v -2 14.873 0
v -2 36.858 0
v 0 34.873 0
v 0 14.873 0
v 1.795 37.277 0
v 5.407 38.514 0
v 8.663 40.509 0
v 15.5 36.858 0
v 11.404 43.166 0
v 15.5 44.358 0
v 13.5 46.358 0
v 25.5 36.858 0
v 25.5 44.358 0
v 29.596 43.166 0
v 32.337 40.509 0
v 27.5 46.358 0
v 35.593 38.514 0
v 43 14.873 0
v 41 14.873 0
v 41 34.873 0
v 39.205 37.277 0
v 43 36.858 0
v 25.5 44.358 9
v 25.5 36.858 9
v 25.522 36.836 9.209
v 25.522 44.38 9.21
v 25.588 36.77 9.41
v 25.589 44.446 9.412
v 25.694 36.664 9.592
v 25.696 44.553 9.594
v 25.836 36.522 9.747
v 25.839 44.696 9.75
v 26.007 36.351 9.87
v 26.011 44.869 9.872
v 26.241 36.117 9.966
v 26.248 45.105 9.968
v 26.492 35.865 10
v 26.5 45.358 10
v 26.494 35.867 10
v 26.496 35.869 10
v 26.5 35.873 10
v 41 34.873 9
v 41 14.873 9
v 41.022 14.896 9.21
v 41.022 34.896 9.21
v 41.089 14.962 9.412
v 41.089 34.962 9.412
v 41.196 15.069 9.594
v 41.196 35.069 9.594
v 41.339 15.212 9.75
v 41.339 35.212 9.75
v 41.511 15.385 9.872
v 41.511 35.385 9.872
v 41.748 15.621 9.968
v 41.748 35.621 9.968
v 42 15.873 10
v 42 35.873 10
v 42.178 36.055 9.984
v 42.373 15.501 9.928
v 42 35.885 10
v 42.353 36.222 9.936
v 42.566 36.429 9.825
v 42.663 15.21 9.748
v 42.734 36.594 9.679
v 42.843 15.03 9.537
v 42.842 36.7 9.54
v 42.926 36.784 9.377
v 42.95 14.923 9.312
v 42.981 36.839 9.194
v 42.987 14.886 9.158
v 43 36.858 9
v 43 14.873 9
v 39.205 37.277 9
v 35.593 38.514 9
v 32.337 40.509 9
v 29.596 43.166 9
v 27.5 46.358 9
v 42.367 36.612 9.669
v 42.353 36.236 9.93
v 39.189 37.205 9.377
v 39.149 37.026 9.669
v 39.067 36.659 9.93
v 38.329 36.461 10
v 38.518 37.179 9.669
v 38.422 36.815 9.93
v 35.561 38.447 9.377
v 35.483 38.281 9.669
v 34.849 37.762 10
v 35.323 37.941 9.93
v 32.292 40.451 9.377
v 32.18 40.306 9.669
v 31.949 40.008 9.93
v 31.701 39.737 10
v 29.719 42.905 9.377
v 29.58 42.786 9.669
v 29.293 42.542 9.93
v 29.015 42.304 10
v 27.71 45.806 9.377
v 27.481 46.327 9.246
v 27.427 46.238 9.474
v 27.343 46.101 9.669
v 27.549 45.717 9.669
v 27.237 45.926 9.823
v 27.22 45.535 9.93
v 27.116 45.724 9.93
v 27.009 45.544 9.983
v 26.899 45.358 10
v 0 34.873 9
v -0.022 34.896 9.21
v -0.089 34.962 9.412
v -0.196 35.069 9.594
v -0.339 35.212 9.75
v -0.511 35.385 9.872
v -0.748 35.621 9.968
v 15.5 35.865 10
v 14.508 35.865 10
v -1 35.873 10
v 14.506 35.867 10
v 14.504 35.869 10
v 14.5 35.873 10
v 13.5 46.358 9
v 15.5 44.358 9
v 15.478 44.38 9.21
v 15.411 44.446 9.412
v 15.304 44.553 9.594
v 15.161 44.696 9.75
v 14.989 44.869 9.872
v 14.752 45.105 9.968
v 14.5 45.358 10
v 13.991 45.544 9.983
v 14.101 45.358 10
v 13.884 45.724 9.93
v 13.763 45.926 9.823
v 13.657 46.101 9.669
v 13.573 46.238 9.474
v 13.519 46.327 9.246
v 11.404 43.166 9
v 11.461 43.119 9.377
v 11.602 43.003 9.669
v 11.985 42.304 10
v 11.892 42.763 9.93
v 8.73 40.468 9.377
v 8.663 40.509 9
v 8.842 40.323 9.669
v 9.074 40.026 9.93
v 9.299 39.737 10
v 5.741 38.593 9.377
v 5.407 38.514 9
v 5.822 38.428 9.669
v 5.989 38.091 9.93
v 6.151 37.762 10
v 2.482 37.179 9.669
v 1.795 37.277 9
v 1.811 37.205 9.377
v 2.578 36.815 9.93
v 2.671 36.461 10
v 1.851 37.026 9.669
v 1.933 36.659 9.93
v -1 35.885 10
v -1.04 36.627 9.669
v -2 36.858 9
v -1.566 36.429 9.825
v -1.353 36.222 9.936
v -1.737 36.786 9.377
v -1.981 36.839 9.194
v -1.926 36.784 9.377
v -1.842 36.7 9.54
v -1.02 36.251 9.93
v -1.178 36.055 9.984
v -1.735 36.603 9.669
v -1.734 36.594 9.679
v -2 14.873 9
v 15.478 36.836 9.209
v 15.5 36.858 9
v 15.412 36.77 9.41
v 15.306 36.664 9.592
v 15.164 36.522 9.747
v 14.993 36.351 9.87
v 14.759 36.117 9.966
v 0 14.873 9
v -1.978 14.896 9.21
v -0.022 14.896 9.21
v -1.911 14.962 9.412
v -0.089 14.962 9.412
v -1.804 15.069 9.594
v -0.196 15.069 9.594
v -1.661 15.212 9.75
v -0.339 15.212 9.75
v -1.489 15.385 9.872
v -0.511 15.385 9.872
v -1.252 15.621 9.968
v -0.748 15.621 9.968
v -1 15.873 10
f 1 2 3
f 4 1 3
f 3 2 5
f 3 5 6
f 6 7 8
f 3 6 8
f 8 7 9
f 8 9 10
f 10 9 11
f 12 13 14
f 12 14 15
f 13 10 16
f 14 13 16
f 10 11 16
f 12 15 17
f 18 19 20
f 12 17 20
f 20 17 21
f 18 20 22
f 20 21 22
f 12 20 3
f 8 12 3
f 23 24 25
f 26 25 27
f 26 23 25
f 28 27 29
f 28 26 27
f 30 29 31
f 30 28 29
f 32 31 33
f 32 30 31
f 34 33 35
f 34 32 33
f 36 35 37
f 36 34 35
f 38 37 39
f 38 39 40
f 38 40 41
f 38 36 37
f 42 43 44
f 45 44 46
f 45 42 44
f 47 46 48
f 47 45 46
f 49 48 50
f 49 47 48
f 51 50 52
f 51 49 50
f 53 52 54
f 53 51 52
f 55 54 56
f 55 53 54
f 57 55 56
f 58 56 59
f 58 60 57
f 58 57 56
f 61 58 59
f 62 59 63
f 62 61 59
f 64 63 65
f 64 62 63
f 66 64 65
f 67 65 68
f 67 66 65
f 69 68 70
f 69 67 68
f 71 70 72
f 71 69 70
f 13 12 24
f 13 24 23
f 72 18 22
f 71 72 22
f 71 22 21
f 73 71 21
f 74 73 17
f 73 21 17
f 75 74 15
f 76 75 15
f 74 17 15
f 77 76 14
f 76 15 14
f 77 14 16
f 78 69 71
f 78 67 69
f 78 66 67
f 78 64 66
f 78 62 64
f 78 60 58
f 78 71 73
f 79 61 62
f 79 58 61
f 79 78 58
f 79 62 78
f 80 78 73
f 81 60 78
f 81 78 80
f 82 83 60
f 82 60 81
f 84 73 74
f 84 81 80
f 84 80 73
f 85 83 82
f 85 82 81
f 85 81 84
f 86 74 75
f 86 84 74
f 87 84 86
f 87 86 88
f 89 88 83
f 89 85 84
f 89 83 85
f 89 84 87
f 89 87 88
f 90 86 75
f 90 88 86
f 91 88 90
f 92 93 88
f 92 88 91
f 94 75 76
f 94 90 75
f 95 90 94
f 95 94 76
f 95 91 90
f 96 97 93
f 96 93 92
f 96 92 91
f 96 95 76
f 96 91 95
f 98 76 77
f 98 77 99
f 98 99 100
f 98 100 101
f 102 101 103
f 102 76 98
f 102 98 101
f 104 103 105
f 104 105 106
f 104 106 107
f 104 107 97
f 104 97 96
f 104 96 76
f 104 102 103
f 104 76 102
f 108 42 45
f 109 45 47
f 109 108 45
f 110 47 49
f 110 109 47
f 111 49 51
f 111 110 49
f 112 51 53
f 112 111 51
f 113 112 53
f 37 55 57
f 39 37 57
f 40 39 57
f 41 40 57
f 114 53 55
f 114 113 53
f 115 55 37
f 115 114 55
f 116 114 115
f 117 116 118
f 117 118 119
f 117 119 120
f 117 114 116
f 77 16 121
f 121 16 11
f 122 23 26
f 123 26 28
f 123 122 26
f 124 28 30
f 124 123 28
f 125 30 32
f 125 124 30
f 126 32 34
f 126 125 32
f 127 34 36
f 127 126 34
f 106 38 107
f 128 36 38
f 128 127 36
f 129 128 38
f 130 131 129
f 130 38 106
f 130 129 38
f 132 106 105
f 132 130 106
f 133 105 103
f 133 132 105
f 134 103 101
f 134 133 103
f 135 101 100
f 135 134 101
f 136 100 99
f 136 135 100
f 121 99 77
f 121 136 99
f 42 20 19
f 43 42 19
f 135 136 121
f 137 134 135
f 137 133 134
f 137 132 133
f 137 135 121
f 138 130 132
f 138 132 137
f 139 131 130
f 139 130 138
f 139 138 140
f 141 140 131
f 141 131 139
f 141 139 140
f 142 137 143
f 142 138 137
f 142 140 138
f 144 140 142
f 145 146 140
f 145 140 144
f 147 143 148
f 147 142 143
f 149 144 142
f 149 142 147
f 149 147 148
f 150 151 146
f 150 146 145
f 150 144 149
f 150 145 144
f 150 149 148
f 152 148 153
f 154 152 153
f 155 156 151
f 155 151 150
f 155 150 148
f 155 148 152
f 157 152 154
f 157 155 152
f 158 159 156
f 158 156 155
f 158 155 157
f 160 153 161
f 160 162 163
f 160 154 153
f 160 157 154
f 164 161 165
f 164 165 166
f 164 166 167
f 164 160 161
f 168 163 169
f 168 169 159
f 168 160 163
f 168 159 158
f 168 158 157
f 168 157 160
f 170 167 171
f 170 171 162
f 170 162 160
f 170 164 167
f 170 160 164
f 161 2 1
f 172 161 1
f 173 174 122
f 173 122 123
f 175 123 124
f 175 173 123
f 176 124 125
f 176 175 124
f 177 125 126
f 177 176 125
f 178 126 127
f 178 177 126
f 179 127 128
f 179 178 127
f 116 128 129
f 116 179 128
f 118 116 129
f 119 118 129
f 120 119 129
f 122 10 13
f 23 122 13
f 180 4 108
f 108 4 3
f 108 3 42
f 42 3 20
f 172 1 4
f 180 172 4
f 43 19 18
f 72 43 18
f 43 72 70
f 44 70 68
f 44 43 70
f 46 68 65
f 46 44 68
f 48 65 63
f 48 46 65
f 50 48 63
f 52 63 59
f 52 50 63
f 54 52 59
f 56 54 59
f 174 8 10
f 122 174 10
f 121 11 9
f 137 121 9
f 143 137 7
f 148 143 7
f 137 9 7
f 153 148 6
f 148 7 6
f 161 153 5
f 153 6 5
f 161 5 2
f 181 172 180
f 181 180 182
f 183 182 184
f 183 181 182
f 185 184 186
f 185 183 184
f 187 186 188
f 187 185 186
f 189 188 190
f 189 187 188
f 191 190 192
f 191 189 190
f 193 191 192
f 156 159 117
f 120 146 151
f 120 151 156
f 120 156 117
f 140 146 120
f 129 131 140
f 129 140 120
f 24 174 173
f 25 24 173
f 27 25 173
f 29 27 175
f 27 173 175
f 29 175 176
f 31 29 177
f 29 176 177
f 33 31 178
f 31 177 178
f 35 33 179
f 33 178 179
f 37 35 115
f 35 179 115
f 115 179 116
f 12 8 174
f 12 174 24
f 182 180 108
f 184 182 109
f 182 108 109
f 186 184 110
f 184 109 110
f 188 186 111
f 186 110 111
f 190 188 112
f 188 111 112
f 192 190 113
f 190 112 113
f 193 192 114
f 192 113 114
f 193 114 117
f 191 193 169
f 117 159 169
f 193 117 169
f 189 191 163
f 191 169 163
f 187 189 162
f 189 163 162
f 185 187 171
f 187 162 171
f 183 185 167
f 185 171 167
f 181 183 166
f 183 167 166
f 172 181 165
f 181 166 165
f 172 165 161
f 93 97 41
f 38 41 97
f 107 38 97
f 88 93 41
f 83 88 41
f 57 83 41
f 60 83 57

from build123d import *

# Parameters (mm, degrees)
F0_W         = 10
F0_H         = 7.5
F1_DEPTH     = 10
F2_T1_DEPTH  = 26.9846032165
F2_T3_DEPTH  = 7
F2_T5_DEPTH  = 22.5
F2_T7_DEPTH  = 41
F2_T9_DEPTH  = 7
F2_T11_DEPTH = 19
F2_T13_DEPTH = 7.5
F2_T15_DEPTH = 10
F2_T18_ANGLE = 79.4810617097
F2_T20_ANGLE = 79.4810617097
F2_T25_DEPTH = 25
F2_T29_DEPTH = 43.5
F2_T36_DEPTH = 43.5
F2_T40_DEPTH = 25
F2_T47_DEPTH = 10
F2_T51_DEPTH = 12.5
F2_T58_DEPTH = 10
F2_T62_DEPTH = 12.5
F2_T69_DEPTH = 12.5
F2_T73_DEPTH = 10
F2_T80_DEPTH = 10
F2_T84_DEPTH = 12.5


# Not quite as in the source:
# - a fillet or chamfer that OpenCascade refuses, or shapes differently, is made with other operations: its cross-section is extruded or revolved along the edge and cut away or added


with BuildPart() as f1:
    # F0 (on Top) → F1 (new body)
    with BuildSketch(Plane.XY):
        with BuildLine():
            Line((0, 34.8731837149), (41, 34.8731837149))
            Line((41, 34.8731837149), (41, 14.8731837149))
            Line((41, 14.8731837149), (43, 14.8731837149))
            Line((43, 14.8731837149), (43, 36.8577869315))
            ThreePointArc((43, 36.8577869315), (33.9101705187, 39.4217493566), (27.5, 46.3577869315))
            Line((27.5, 46.3577869315), (13.5, 46.3577869315))
            ThreePointArc((13.5, 46.3577869315), (7.0898294813, 39.4217493566), (-2, 36.8577869315))
            Line((-2, 36.8577869315), (-2, 14.8731837149))
            Line((-2, 14.8731837149), (0, 14.8731837149))
            Line((0, 14.8731837149), (0, 34.8731837149))
        make_face()
        with Locations((20.5, 40.6077869315)):
            Rectangle(F0_W, F0_H, mode=Mode.SUBTRACT)
    extrude(amount=F1_DEPTH)

    # F2: fillet of radius 1 on 14 edges, made by hand

    # F2_s2 → F2_t1 (cut)
    with BuildSketch(Plane.XZ.offset(-39.3577869315)):
        with BuildLine():
            ThreePointArc((-2, 9), (-1.7071067812, 9.7071067812), (-1, 10))
            Line((-1, 10), (-2, 10))
            Line((-2, 10), (-2, 9))
        make_face()
        with BuildLine():
            ThreePointArc((43, 9), (42.7071067812, 9.7071067812), (42, 10))
            Line((42, 10), (43, 10))
            Line((43, 10), (43, 9))
        make_face()
    extrude(amount=F2_T1_DEPTH, mode=Mode.SUBTRACT)

    # F2_s4 → F2_t3 (cut)
    with BuildSketch(Plane.YZ.offset(-4.5)):
        with BuildLine():
            ThreePointArc((14.8731837149, 9), (15.1660769337, 9.7071067812), (15.8731837149, 10))
            Line((15.8731837149, 10), (14.8731837149, 10))
            Line((14.8731837149, 10), (14.8731837149, 9))
        make_face()
    extrude(amount=F2_T3_DEPTH, mode=Mode.SUBTRACT)

    # F2_s6 → F2_t5 (cut)
    with BuildSketch(Plane.XZ.offset(-34.8731837149)):
        with BuildLine():
            ThreePointArc((0, 9), (-0.2928932188, 9.7071067812), (-1, 10))
            Line((-1, 10), (0, 10))
            Line((0, 10), (0, 9))
        make_face()
        with BuildLine():
            ThreePointArc((41, 9), (41.2928932188, 9.7071067812), (42, 10))
            Line((42, 10), (41, 10))
            Line((41, 10), (41, 9))
        make_face()
    extrude(amount=F2_T5_DEPTH, mode=Mode.SUBTRACT)

    # F2_s8 → F2_t7 (cut)
    with BuildSketch(Plane.YZ):
        with BuildLine():
            ThreePointArc((34.8731837149, 9), (35.1660769337, 9.7071067812), (35.8731837149, 10))
            Line((35.8731837149, 10), (34.8731837149, 10))
            Line((34.8731837149, 10), (34.8731837149, 9))
        make_face()
    extrude(amount=F2_T7_DEPTH, mode=Mode.SUBTRACT)

    # F2_s10 → F2_t9 (cut)
    with BuildSketch(Plane.YZ.offset(38.5)):
        with BuildLine():
            ThreePointArc((14.8731837149, 9), (15.1660769337, 9.7071067812), (15.8731837149, 10))
            Line((15.8731837149, 10), (14.8731837149, 10))
            Line((14.8731837149, 10), (14.8731837149, 9))
        make_face()
    extrude(amount=F2_T9_DEPTH, mode=Mode.SUBTRACT)

    # F2_s12 → F2_t11 (cut)
    with BuildSketch(Plane.YZ.offset(11)):
        with BuildLine():
            ThreePointArc((46.3577869315, 9), (46.0648937127, 9.7071067812), (45.3577869315, 10))
            Line((45.3577869315, 10), (46.3577869315, 10))
            Line((46.3577869315, 10), (46.3577869315, 9))
        make_face()
    extrude(amount=F2_T11_DEPTH, mode=Mode.SUBTRACT)

    # F2_s14 → F2_t13 (cut)
    with BuildSketch(Plane.XZ.offset(-44.3577869315)):
        with BuildLine():
            ThreePointArc((25.5, 9), (25.7928932188, 9.7071067812), (26.5, 10))
            Line((26.5, 10), (25.5, 10))
            Line((25.5, 10), (25.5, 9))
        make_face()
        with BuildLine():
            ThreePointArc((15.5, 9), (15.2071067812, 9.7071067812), (14.5, 10))
            Line((14.5, 10), (15.5, 10))
            Line((15.5, 10), (15.5, 9))
        make_face()
    extrude(amount=F2_T13_DEPTH, mode=Mode.SUBTRACT)

    # F2_s16 → F2_t15 (cut)
    with BuildSketch(Plane.YZ.offset(15.5)):
        with BuildLine():
            ThreePointArc((36.8577869315, 9), (36.5648937127, 9.7071067812), (35.8577869315, 10))
            Line((35.8577869315, 10), (36.8577869315, 10))
            Line((36.8577869315, 10), (36.8577869315, 9))
        make_face()
        with BuildLine():
            ThreePointArc((44.3577869315, 9), (44.6506801503, 9.7071067812), (45.3577869315, 10))
            Line((45.3577869315, 10), (44.3577869315, 10))
            Line((44.3577869315, 10), (44.3577869315, 9))
        make_face()
    extrude(amount=F2_T15_DEPTH, mode=Mode.SUBTRACT)

    # F2_s17 → F2_t18 (revolve, cut)
    with BuildSketch(Plane(origin=(16.3105725922, 48.0350676987, 0), x_dir=(0, 0, 1), z_dir=(0.3215254447, 0.9469009391, 0))):
        with BuildLine():
            ThreePointArc((9, -1.9426318697), (9.7071067812, -1.6497386509), (10, -0.9426318697))
            Line((10, -0.9426318697), (10, -1.9426318697))
            Line((10, -1.9426318697), (9, -1.9426318697))
        make_face()
    revolve(axis=Axis((-2, 54.2525237736, 10), (0, 0, -1)), revolution_arc=F2_T18_ANGLE, mode=Mode.SUBTRACT)

    # F2_s19 → F2_t20 (revolve, cut)
    with BuildSketch(Plane(origin=(49.8093527962, 7.2098207335, 0), x_dir=(0, 0, 1), z_dir=(0.9896857587, 0.1432553627, 0))):
        with BuildLine():
            ThreePointArc((9, -30.138232714), (9.7071067812, -29.8453394951), (10, -29.138232714))
            Line((10, -29.138232714), (10, -30.138232714))
            Line((10, -30.138232714), (9, -30.138232714))
        make_face()
    revolve(axis=Axis((43, 54.2525237736, 10), (0, 0, -1)), revolution_arc=F2_T20_ANGLE, mode=Mode.SUBTRACT)


with BuildPart() as f2_tool23:
    # F2_s24 → F2_t25 (new body)
    with BuildSketch(Plane.XZ.offset(-12.3731837149)):
        with BuildLine():
            ThreePointArc((0, 9), (-0.2928932188, 9.7071067812), (-1, 10))
            Line((-1, 10), (0, 10))
            Line((0, 10), (0, 9))
        make_face()
    extrude(amount=-F2_T25_DEPTH)

    split(bisect_by=Plane.XZ.offset(-34.8731837149), keep=Keep.BOTTOM)


with BuildPart() as f2_tool27:
    # F2_s28 → F2_t29 (new body)
    with BuildSketch(Plane.YZ.offset(-2.5)):
        with BuildLine():
            ThreePointArc((34.8731837149, 9), (35.1660769337, 9.7071067812), (35.8731837149, 10))
            Line((35.8731837149, 10), (34.8731837149, 10))
            Line((34.8731837149, 10), (34.8731837149, 9))
        make_face()
    extrude(amount=F2_T29_DEPTH)

    split(bisect_by=Plane.YZ, keep=Keep.BOTTOM)


with BuildPart() as f2_tool23_1:
    add(f2_tool23.part)

    # F2_t31: intersect F2_tool27
    add(f2_tool27.part, mode=Mode.INTERSECT)


with BuildPart() as f1_1:
    add(f1.part)

    # F2_t21: cut F2_tool23
    add(f2_tool23_1.part, mode=Mode.SUBTRACT)


with BuildPart() as f2_tool34:
    # F2_s35 → F2_t36 (new body)
    with BuildSketch(Plane.YZ):
        with BuildLine():
            ThreePointArc((34.8731837149, 9), (35.1660769337, 9.7071067812), (35.8731837149, 10))
            Line((35.8731837149, 10), (34.8731837149, 10))
            Line((34.8731837149, 10), (34.8731837149, 9))
        make_face()
    extrude(amount=F2_T36_DEPTH)

    split(bisect_by=Plane.YZ.offset(41), keep=Keep.TOP)


with BuildPart() as f2_tool38:
    # F2_s39 → F2_t40 (new body)
    with BuildSketch(Plane.XZ.offset(-37.3731837149)):
        with BuildLine():
            ThreePointArc((41, 9), (41.2928932188, 9.7071067812), (42, 10))
            Line((42, 10), (41, 10))
            Line((41, 10), (41, 9))
        make_face()
    extrude(amount=F2_T40_DEPTH)

    split(bisect_by=Plane.XZ.offset(-34.8731837149), keep=Keep.BOTTOM)


with BuildPart() as f2_tool34_1:
    add(f2_tool34.part)

    # F2_t42: intersect F2_tool38
    add(f2_tool38.part, mode=Mode.INTERSECT)


with BuildPart() as f1_2:
    add(f1_1.part)

    # F2_t32: cut F2_tool34
    add(f2_tool34_1.part, mode=Mode.SUBTRACT)


with BuildPart() as f2_tool45:
    # F2_s46 → F2_t47 (new body)
    with BuildSketch(Plane.XZ.offset(-46.8577869315)):
        with BuildLine():
            ThreePointArc((25.5, 9), (25.7928932188, 9.7071067812), (26.5, 10))
            Line((26.5, 10), (25.5, 10))
            Line((25.5, 10), (25.5, 9))
        make_face()
    extrude(amount=F2_T47_DEPTH)

    split(bisect_by=Plane.XZ.offset(-44.3577869315), keep=Keep.BOTTOM)


with BuildPart() as f2_tool49:
    # F2_s50 → F2_t51 (new body)
    with BuildSketch(Plane.YZ.offset(15.5)):
        with BuildLine():
            ThreePointArc((44.3577869315, 9), (44.6506801503, 9.7071067812), (45.3577869315, 10))
            Line((45.3577869315, 10), (44.3577869315, 10))
            Line((44.3577869315, 10), (44.3577869315, 9))
        make_face()
    extrude(amount=F2_T51_DEPTH)

    split(bisect_by=Plane.YZ.offset(25.5), keep=Keep.TOP)


with BuildPart() as f2_tool45_1:
    add(f2_tool45.part)

    # F2_t53: intersect F2_tool49
    add(f2_tool49.part, mode=Mode.INTERSECT)


with BuildPart() as f1_3:
    add(f1_2.part)

    # F2_t43: cut F2_tool45
    add(f2_tool45_1.part, mode=Mode.SUBTRACT)


with BuildPart() as f2_tool56:
    # F2_s57 → F2_t58 (new body)
    with BuildSketch(Plane.XZ.offset(-44.3577869315)):
        with BuildLine():
            ThreePointArc((25.5, 9), (25.7928932188, 9.7071067812), (26.5, 10))
            Line((26.5, 10), (25.5, 10))
            Line((25.5, 10), (25.5, 9))
        make_face()
    extrude(amount=F2_T58_DEPTH)

    split(bisect_by=Plane.XZ.offset(-36.8577869315), keep=Keep.TOP)


with BuildPart() as f2_tool60:
    # F2_s61 → F2_t62 (new body)
    with BuildSketch(Plane.YZ.offset(28)):
        with BuildLine():
            ThreePointArc((36.8577869315, 9), (36.5648937127, 9.7071067812), (35.8577869315, 10))
            Line((35.8577869315, 10), (36.8577869315, 10))
            Line((36.8577869315, 10), (36.8577869315, 9))
        make_face()
    extrude(amount=-F2_T62_DEPTH)

    split(bisect_by=Plane.YZ.offset(25.5), keep=Keep.TOP)


with BuildPart() as f2_tool56_1:
    add(f2_tool56.part)

    # F2_t64: intersect F2_tool60
    add(f2_tool60.part, mode=Mode.INTERSECT)


with BuildPart() as f1_4:
    add(f1_3.part)

    # F2_t54: cut F2_tool56
    add(f2_tool56_1.part, mode=Mode.SUBTRACT)


with BuildPart() as f2_tool67:
    # F2_s68 → F2_t69 (new body)
    with BuildSketch(Plane.YZ.offset(25.5)):
        with BuildLine():
            ThreePointArc((36.8577869315, 9), (36.5648937127, 9.7071067812), (35.8577869315, 10))
            Line((35.8577869315, 10), (36.8577869315, 10))
            Line((36.8577869315, 10), (36.8577869315, 9))
        make_face()
    extrude(amount=-F2_T69_DEPTH)

    split(bisect_by=Plane.YZ.offset(15.5), keep=Keep.BOTTOM)


with BuildPart() as f2_tool71:
    # F2_s72 → F2_t73 (new body)
    with BuildSketch(Plane.XZ.offset(-34.3577869315)):
        with BuildLine():
            ThreePointArc((15.5, 9), (15.2071067812, 9.7071067812), (14.5, 10))
            Line((14.5, 10), (15.5, 10))
            Line((15.5, 10), (15.5, 9))
        make_face()
    extrude(amount=-F2_T73_DEPTH)

    split(bisect_by=Plane.XZ.offset(-36.8577869315), keep=Keep.TOP)


with BuildPart() as f2_tool67_1:
    add(f2_tool67.part)

    # F2_t75: intersect F2_tool71
    add(f2_tool71.part, mode=Mode.INTERSECT)


with BuildPart() as f1_5:
    add(f1_4.part)

    # F2_t65: cut F2_tool67
    add(f2_tool67_1.part, mode=Mode.SUBTRACT)


with BuildPart() as f2_tool78:
    # F2_s79 → F2_t80 (new body)
    with BuildSketch(Plane.XZ.offset(-36.8577869315)):
        with BuildLine():
            ThreePointArc((15.5, 9), (15.2071067812, 9.7071067812), (14.5, 10))
            Line((14.5, 10), (15.5, 10))
            Line((15.5, 10), (15.5, 9))
        make_face()
    extrude(amount=-F2_T80_DEPTH)

    split(bisect_by=Plane.XZ.offset(-44.3577869315), keep=Keep.BOTTOM)


with BuildPart() as f2_tool82:
    # F2_s83 → F2_t84 (new body)
    with BuildSketch(Plane.YZ.offset(13)):
        with BuildLine():
            ThreePointArc((44.3577869315, 9), (44.6506801503, 9.7071067812), (45.3577869315, 10))
            Line((45.3577869315, 10), (44.3577869315, 10))
            Line((44.3577869315, 10), (44.3577869315, 9))
        make_face()
    extrude(amount=F2_T84_DEPTH)

    split(bisect_by=Plane.YZ.offset(15.5), keep=Keep.BOTTOM)


with BuildPart() as f2_tool78_1:
    add(f2_tool78.part)

    # F2_t86: intersect F2_tool82
    add(f2_tool82.part, mode=Mode.INTERSECT)


with BuildPart() as f1_6:
    add(f1_5.part)

    # F2_t76: cut F2_tool78
    add(f2_tool78_1.part, mode=Mode.SUBTRACT)


solid = f1_6.part
